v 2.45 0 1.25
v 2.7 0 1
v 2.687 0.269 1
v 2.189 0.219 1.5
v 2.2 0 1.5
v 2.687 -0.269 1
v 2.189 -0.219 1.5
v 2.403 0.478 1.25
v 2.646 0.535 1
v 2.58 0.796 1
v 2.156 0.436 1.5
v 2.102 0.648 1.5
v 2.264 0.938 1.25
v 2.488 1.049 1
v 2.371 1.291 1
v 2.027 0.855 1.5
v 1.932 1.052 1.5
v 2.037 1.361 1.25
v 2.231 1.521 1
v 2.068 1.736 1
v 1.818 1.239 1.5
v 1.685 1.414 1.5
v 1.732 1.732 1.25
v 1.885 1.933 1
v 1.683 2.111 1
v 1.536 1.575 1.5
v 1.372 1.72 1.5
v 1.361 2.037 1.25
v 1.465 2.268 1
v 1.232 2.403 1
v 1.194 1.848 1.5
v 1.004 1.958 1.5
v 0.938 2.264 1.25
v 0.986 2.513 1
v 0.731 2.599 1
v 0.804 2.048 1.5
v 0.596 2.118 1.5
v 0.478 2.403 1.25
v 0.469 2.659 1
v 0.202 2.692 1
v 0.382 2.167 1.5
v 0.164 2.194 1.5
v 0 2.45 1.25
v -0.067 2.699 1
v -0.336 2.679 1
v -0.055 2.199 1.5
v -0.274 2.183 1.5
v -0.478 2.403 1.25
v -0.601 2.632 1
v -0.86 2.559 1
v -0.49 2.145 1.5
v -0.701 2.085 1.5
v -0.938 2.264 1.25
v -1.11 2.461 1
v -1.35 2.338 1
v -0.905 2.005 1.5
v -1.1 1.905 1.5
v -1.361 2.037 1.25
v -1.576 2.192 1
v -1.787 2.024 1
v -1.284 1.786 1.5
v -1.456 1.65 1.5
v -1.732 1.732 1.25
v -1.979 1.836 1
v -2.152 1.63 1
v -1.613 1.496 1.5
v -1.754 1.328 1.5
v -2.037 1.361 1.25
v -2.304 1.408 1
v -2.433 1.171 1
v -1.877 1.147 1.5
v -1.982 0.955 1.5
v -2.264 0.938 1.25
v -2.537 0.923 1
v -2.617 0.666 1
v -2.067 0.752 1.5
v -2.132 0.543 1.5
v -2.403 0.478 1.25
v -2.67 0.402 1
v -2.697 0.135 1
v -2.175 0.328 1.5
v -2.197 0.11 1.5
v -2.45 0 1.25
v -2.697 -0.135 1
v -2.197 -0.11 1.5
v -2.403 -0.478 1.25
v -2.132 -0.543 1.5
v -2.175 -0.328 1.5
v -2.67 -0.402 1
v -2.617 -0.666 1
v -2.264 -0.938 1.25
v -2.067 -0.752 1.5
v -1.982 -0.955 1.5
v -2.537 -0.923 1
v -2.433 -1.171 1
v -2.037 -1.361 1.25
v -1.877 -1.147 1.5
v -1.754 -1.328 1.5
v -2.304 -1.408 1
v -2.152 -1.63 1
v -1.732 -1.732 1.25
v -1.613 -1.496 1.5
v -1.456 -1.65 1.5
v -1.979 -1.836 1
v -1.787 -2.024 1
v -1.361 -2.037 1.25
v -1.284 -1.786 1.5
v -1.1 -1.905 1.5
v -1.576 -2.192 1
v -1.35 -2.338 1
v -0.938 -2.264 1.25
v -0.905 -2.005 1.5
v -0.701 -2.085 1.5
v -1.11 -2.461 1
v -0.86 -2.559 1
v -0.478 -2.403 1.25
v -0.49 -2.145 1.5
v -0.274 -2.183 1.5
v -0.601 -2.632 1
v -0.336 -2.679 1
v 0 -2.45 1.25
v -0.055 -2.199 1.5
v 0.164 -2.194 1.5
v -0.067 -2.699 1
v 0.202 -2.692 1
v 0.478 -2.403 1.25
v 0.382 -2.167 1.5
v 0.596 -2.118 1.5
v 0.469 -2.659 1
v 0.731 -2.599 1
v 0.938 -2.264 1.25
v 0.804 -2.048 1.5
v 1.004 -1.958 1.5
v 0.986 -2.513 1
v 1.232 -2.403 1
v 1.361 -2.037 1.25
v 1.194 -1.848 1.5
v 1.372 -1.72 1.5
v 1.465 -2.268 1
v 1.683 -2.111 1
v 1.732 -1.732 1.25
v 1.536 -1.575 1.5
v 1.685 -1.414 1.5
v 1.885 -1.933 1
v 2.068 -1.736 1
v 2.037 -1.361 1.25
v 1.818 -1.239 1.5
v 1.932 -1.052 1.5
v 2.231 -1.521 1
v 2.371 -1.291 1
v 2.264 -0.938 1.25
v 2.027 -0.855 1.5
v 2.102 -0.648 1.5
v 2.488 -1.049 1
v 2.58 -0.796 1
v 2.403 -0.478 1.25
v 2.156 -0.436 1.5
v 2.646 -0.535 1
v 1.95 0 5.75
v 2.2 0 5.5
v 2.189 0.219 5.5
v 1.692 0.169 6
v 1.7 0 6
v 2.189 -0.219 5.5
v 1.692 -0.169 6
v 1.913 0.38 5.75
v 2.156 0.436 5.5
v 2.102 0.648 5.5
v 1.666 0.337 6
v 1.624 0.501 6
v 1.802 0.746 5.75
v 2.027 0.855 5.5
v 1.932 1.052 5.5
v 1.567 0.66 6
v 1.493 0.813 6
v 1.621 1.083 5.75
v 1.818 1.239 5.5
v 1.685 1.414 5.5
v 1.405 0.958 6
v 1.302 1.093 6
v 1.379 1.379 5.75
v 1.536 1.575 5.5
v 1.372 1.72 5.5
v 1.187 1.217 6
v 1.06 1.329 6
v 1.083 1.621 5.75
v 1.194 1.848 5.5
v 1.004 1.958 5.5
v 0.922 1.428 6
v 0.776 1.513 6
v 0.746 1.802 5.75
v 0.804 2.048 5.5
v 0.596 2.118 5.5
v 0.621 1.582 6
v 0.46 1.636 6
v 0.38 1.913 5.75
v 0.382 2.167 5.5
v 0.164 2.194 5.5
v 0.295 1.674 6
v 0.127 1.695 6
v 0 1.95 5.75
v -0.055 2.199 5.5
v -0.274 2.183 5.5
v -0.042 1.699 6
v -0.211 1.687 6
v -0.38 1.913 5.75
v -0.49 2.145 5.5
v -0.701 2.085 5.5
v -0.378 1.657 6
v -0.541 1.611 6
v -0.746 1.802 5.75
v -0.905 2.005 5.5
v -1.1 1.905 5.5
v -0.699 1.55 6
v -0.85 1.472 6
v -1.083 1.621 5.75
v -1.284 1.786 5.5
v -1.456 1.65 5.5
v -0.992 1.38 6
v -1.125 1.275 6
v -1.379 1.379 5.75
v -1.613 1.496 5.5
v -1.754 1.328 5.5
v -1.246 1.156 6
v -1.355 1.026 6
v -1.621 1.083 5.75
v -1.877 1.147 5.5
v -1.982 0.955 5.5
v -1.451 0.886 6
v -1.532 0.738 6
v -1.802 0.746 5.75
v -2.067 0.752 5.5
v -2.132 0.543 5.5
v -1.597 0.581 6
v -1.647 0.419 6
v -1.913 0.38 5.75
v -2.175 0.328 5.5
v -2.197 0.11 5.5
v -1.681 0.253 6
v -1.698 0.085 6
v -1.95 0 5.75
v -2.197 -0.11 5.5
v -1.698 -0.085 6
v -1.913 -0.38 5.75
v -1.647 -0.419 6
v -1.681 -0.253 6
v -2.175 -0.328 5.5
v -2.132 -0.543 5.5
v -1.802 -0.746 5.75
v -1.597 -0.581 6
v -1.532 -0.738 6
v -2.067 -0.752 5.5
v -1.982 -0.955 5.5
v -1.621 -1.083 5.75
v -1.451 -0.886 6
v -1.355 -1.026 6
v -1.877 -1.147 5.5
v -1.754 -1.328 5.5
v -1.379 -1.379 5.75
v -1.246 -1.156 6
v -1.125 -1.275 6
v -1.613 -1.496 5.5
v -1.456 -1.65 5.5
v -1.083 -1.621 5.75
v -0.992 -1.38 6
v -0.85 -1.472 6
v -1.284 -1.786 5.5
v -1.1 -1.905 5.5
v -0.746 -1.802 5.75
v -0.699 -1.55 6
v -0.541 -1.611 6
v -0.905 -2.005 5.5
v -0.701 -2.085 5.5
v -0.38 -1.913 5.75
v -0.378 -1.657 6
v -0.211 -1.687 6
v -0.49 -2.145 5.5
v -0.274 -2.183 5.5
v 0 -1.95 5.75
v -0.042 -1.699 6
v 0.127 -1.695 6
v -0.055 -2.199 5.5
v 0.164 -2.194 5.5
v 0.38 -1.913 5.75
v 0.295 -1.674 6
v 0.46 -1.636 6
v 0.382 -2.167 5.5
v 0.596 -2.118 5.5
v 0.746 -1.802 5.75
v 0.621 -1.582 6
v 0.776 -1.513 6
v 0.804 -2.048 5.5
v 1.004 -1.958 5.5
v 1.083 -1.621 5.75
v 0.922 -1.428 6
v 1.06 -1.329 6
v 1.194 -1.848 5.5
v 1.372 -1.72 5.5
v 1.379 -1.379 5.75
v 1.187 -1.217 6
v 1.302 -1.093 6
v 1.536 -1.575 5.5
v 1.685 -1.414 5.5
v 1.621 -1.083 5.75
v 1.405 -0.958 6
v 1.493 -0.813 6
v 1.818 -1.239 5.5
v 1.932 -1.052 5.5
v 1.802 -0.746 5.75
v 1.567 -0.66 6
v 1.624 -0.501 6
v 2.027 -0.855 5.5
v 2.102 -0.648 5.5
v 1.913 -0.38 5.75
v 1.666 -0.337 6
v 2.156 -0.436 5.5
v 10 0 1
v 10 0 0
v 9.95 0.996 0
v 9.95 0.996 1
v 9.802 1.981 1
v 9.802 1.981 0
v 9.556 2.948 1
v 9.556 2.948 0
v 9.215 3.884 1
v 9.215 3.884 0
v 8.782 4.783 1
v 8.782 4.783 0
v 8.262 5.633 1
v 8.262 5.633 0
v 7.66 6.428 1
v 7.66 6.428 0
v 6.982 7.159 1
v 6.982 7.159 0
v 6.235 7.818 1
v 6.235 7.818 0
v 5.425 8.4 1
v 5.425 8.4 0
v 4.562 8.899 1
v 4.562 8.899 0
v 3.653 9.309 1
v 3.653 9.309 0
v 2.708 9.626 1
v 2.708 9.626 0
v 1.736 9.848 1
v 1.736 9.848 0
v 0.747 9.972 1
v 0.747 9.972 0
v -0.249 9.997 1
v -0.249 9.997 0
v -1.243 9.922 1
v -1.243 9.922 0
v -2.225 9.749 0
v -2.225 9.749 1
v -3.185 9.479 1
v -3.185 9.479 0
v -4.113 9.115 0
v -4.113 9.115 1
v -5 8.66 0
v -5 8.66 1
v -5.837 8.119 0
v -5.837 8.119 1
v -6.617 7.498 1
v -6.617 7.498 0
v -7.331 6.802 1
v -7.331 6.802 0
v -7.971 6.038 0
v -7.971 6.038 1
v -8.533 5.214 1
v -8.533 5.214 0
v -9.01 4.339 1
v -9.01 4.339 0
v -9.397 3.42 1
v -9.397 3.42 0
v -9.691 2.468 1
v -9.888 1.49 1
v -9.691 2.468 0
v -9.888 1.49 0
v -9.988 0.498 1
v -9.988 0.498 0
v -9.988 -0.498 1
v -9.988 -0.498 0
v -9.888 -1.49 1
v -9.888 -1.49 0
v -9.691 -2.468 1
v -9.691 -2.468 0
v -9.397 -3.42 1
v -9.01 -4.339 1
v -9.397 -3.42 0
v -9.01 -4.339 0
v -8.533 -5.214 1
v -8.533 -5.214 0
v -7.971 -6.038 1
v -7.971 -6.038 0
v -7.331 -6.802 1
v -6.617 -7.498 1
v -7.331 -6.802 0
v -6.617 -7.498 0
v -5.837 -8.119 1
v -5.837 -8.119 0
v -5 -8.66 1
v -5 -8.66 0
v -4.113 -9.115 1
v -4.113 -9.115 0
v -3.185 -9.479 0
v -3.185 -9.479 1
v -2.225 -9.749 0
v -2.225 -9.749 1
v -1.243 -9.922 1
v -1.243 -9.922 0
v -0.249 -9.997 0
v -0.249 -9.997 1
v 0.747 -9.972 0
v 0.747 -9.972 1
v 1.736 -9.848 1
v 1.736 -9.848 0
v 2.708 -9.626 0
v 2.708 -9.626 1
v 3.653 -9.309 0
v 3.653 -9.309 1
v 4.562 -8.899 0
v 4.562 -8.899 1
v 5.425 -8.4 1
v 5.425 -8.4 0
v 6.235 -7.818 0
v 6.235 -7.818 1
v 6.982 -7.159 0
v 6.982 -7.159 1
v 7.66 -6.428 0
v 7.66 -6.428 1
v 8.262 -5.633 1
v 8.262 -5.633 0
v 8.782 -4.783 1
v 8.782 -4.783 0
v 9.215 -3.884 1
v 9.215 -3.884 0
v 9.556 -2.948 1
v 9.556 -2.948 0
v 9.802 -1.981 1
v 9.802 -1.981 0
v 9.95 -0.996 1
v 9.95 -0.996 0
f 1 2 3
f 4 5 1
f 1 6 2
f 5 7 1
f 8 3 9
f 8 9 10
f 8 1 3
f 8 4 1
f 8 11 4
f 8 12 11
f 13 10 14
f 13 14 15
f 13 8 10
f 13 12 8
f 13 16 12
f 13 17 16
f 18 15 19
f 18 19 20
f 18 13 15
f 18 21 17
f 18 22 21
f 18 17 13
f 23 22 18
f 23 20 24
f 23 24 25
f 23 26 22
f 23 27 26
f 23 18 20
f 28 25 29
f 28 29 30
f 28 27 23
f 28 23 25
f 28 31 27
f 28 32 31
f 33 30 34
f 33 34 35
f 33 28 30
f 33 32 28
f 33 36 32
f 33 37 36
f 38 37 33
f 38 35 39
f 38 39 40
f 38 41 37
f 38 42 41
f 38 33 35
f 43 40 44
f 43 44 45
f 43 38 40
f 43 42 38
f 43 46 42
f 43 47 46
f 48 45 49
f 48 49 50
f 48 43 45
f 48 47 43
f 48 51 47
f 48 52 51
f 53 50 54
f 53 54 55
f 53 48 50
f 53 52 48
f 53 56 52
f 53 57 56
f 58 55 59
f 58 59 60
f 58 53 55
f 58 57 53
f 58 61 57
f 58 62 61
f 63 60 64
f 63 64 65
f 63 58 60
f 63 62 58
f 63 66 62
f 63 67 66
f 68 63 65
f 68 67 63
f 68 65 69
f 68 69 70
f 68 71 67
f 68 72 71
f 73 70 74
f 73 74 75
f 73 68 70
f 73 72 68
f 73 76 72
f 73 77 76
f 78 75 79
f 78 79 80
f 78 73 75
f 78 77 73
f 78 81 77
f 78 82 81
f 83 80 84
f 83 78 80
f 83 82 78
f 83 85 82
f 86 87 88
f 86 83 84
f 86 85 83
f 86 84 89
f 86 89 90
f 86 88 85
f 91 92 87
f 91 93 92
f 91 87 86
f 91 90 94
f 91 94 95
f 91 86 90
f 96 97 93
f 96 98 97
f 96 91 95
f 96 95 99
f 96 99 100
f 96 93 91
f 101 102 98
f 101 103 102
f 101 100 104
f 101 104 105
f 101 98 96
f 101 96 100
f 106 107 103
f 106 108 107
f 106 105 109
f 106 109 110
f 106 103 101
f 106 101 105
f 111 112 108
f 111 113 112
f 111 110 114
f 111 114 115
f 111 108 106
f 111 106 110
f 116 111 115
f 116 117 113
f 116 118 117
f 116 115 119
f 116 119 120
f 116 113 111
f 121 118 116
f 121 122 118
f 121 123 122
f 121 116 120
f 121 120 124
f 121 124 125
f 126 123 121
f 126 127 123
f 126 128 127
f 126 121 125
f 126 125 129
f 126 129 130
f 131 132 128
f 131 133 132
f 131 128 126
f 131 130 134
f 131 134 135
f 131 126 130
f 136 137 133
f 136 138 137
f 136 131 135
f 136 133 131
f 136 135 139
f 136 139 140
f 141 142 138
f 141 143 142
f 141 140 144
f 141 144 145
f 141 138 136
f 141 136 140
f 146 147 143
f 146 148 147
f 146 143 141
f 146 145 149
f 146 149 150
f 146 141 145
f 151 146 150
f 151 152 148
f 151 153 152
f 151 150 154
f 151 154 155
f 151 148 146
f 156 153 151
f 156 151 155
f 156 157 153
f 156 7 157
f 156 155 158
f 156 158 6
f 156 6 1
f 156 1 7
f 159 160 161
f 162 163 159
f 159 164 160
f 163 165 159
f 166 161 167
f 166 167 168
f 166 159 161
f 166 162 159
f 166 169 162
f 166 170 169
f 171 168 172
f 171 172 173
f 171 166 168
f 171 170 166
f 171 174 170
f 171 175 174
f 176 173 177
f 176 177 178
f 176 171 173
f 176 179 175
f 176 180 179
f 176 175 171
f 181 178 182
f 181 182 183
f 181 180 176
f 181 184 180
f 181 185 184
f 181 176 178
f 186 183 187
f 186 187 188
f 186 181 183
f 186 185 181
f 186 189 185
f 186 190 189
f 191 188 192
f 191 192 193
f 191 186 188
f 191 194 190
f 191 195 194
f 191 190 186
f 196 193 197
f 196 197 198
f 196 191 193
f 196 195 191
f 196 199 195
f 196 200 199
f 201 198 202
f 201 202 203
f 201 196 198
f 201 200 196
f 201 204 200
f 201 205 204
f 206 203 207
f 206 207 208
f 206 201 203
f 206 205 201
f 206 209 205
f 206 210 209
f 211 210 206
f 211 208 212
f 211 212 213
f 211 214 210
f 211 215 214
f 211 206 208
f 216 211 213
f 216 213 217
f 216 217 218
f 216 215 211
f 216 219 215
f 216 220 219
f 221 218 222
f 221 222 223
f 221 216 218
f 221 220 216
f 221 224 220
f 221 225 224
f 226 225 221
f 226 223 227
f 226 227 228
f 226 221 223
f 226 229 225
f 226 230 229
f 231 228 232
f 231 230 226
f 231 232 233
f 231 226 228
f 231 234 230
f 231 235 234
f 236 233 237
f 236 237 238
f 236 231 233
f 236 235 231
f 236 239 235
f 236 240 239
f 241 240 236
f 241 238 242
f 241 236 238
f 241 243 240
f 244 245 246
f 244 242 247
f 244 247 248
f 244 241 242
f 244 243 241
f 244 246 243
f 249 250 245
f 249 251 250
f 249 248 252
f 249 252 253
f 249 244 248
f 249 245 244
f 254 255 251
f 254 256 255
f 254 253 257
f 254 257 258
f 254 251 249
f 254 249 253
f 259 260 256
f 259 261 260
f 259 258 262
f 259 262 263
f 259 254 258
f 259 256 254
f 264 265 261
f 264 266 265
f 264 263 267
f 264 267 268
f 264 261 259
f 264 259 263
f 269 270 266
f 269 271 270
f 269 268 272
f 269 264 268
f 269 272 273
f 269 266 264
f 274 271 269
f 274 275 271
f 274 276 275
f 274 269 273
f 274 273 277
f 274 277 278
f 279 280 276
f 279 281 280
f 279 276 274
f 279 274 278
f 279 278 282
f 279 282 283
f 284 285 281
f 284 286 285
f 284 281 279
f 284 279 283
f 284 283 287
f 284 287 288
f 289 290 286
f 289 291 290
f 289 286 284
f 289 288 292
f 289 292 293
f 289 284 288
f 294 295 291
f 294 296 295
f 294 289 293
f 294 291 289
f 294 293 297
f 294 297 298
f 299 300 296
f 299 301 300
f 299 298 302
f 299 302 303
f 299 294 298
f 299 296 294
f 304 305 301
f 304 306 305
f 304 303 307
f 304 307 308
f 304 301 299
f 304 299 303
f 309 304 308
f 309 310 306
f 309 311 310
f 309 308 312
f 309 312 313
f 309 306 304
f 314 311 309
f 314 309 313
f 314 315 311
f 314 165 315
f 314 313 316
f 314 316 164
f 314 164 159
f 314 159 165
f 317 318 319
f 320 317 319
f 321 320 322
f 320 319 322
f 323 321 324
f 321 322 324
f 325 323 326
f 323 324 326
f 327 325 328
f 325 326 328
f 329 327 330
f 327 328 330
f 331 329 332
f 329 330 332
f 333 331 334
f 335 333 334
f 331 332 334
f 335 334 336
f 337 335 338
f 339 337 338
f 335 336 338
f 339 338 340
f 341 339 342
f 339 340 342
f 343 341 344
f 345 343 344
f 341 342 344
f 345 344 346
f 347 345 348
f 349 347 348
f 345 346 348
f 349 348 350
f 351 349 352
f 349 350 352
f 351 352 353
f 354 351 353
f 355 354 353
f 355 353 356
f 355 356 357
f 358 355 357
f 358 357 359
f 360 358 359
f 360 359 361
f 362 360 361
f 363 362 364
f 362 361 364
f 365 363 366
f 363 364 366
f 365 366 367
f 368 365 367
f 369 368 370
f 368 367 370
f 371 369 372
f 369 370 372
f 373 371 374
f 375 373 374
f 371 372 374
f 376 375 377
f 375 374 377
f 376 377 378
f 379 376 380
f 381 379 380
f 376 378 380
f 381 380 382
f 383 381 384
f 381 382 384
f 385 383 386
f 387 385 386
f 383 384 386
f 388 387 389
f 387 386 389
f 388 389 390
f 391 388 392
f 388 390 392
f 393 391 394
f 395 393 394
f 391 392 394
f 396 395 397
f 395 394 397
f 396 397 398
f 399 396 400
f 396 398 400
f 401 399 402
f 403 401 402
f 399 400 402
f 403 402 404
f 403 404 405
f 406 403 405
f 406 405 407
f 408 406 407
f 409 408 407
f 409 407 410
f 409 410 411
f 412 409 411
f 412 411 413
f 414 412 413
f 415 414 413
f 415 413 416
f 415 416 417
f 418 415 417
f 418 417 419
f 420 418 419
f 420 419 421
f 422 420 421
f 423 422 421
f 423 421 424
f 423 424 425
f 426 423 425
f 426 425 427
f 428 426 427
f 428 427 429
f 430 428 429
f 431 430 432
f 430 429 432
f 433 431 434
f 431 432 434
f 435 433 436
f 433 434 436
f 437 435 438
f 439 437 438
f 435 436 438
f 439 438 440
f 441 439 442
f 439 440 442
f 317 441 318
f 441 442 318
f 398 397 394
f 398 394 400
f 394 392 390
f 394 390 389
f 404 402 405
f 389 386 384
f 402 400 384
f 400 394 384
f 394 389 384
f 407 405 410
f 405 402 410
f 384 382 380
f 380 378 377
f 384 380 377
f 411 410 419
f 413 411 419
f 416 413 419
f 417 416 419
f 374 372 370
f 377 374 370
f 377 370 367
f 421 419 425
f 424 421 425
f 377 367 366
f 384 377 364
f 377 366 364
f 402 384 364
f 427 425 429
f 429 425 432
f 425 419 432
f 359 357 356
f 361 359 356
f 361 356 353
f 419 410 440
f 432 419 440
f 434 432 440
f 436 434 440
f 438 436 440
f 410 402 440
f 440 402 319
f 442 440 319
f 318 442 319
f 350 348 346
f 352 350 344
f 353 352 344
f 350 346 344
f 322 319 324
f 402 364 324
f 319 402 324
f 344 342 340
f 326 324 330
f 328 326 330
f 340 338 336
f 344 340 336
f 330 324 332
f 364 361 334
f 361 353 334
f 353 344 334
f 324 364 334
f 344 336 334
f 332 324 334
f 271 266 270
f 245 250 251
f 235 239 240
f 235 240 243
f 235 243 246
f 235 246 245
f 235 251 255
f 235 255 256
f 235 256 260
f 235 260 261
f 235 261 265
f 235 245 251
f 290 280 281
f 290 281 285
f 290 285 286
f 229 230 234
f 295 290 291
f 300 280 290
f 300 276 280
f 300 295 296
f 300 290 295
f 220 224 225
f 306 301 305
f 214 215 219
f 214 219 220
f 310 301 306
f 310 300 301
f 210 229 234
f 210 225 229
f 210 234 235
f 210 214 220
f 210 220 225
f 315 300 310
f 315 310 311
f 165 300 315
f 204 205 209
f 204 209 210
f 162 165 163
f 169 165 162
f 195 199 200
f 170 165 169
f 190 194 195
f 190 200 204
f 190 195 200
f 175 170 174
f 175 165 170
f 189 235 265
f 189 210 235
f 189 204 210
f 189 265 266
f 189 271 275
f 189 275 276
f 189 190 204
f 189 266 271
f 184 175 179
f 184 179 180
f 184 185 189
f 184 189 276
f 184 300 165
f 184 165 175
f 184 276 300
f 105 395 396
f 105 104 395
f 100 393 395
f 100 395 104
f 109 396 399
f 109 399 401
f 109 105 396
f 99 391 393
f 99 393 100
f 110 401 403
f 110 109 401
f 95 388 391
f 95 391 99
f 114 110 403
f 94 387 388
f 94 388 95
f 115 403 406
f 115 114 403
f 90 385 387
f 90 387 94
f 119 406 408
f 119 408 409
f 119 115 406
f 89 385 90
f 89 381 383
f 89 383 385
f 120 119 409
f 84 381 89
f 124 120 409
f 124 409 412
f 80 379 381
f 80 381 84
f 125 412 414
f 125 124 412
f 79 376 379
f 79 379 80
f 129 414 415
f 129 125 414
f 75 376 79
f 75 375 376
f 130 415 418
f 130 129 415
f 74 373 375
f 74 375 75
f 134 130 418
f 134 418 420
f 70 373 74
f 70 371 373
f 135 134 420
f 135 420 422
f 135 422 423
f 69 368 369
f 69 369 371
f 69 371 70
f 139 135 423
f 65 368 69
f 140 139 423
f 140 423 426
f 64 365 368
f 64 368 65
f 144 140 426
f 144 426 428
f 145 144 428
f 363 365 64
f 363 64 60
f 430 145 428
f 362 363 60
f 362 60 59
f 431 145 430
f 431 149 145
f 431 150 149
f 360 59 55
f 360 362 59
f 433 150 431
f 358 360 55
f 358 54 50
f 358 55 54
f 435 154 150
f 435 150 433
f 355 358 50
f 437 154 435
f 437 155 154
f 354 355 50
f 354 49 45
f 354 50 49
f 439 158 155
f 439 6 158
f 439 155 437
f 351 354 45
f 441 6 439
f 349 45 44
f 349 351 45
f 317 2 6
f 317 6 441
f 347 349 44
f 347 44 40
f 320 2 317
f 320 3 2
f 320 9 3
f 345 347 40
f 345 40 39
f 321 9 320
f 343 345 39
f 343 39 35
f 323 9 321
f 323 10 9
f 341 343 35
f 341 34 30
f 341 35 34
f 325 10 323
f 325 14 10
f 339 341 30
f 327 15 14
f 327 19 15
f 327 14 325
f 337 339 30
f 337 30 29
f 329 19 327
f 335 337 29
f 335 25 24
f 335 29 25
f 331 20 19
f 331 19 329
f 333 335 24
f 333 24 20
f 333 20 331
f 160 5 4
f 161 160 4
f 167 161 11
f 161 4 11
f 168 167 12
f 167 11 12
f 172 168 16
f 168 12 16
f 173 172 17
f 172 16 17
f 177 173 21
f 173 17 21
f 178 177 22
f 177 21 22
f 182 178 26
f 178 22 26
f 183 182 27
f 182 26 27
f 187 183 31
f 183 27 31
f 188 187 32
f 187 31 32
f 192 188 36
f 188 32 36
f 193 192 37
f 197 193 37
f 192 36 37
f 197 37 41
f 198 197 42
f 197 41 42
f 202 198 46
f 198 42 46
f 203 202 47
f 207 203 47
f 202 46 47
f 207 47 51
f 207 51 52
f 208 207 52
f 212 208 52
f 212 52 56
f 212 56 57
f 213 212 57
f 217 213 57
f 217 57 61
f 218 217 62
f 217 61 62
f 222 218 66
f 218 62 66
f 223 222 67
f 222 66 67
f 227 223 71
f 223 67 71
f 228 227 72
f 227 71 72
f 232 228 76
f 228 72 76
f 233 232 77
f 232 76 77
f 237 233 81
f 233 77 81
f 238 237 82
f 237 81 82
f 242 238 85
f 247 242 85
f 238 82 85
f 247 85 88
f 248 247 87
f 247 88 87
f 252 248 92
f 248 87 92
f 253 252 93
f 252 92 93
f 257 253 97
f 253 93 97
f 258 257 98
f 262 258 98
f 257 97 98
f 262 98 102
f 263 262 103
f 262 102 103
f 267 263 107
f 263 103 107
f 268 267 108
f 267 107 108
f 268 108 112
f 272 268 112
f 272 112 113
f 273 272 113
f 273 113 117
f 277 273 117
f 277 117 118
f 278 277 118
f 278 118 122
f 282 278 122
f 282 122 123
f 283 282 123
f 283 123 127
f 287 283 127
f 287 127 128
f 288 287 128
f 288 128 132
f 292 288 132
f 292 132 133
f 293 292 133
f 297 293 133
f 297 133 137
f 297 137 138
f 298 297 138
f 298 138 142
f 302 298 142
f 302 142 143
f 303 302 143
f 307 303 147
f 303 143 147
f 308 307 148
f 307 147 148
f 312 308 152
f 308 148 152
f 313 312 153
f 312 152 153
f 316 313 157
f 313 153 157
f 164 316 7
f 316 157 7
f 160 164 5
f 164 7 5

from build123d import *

# Parameters (mm, degrees)
F0_R     = 10
F1_DEPTH = 1
F2_R     = 2.2
F3_DEPTH = 5
F4_SIZE  = 0.5


with BuildPart() as f1:
    # F0 (on Top) → F1 (new body)
    with BuildSketch(Plane.XY):
        Circle(F0_R)
    extrude(amount=F1_DEPTH)

    # F2 (on face) → F3 (join)
    with BuildSketch(Plane.XY.offset(1)):
        Circle(F2_R)
    extrude(amount=F3_DEPTH)

    # F4
    f4_edges = [f1.edges().sort_by_distance(p)[0] for p in [
        (-2.2, 0, 1),
        (-2.2, 0, 6),
    ]]
    chamfer(f4_edges, length=F4_SIZE)


solid = f1.part
